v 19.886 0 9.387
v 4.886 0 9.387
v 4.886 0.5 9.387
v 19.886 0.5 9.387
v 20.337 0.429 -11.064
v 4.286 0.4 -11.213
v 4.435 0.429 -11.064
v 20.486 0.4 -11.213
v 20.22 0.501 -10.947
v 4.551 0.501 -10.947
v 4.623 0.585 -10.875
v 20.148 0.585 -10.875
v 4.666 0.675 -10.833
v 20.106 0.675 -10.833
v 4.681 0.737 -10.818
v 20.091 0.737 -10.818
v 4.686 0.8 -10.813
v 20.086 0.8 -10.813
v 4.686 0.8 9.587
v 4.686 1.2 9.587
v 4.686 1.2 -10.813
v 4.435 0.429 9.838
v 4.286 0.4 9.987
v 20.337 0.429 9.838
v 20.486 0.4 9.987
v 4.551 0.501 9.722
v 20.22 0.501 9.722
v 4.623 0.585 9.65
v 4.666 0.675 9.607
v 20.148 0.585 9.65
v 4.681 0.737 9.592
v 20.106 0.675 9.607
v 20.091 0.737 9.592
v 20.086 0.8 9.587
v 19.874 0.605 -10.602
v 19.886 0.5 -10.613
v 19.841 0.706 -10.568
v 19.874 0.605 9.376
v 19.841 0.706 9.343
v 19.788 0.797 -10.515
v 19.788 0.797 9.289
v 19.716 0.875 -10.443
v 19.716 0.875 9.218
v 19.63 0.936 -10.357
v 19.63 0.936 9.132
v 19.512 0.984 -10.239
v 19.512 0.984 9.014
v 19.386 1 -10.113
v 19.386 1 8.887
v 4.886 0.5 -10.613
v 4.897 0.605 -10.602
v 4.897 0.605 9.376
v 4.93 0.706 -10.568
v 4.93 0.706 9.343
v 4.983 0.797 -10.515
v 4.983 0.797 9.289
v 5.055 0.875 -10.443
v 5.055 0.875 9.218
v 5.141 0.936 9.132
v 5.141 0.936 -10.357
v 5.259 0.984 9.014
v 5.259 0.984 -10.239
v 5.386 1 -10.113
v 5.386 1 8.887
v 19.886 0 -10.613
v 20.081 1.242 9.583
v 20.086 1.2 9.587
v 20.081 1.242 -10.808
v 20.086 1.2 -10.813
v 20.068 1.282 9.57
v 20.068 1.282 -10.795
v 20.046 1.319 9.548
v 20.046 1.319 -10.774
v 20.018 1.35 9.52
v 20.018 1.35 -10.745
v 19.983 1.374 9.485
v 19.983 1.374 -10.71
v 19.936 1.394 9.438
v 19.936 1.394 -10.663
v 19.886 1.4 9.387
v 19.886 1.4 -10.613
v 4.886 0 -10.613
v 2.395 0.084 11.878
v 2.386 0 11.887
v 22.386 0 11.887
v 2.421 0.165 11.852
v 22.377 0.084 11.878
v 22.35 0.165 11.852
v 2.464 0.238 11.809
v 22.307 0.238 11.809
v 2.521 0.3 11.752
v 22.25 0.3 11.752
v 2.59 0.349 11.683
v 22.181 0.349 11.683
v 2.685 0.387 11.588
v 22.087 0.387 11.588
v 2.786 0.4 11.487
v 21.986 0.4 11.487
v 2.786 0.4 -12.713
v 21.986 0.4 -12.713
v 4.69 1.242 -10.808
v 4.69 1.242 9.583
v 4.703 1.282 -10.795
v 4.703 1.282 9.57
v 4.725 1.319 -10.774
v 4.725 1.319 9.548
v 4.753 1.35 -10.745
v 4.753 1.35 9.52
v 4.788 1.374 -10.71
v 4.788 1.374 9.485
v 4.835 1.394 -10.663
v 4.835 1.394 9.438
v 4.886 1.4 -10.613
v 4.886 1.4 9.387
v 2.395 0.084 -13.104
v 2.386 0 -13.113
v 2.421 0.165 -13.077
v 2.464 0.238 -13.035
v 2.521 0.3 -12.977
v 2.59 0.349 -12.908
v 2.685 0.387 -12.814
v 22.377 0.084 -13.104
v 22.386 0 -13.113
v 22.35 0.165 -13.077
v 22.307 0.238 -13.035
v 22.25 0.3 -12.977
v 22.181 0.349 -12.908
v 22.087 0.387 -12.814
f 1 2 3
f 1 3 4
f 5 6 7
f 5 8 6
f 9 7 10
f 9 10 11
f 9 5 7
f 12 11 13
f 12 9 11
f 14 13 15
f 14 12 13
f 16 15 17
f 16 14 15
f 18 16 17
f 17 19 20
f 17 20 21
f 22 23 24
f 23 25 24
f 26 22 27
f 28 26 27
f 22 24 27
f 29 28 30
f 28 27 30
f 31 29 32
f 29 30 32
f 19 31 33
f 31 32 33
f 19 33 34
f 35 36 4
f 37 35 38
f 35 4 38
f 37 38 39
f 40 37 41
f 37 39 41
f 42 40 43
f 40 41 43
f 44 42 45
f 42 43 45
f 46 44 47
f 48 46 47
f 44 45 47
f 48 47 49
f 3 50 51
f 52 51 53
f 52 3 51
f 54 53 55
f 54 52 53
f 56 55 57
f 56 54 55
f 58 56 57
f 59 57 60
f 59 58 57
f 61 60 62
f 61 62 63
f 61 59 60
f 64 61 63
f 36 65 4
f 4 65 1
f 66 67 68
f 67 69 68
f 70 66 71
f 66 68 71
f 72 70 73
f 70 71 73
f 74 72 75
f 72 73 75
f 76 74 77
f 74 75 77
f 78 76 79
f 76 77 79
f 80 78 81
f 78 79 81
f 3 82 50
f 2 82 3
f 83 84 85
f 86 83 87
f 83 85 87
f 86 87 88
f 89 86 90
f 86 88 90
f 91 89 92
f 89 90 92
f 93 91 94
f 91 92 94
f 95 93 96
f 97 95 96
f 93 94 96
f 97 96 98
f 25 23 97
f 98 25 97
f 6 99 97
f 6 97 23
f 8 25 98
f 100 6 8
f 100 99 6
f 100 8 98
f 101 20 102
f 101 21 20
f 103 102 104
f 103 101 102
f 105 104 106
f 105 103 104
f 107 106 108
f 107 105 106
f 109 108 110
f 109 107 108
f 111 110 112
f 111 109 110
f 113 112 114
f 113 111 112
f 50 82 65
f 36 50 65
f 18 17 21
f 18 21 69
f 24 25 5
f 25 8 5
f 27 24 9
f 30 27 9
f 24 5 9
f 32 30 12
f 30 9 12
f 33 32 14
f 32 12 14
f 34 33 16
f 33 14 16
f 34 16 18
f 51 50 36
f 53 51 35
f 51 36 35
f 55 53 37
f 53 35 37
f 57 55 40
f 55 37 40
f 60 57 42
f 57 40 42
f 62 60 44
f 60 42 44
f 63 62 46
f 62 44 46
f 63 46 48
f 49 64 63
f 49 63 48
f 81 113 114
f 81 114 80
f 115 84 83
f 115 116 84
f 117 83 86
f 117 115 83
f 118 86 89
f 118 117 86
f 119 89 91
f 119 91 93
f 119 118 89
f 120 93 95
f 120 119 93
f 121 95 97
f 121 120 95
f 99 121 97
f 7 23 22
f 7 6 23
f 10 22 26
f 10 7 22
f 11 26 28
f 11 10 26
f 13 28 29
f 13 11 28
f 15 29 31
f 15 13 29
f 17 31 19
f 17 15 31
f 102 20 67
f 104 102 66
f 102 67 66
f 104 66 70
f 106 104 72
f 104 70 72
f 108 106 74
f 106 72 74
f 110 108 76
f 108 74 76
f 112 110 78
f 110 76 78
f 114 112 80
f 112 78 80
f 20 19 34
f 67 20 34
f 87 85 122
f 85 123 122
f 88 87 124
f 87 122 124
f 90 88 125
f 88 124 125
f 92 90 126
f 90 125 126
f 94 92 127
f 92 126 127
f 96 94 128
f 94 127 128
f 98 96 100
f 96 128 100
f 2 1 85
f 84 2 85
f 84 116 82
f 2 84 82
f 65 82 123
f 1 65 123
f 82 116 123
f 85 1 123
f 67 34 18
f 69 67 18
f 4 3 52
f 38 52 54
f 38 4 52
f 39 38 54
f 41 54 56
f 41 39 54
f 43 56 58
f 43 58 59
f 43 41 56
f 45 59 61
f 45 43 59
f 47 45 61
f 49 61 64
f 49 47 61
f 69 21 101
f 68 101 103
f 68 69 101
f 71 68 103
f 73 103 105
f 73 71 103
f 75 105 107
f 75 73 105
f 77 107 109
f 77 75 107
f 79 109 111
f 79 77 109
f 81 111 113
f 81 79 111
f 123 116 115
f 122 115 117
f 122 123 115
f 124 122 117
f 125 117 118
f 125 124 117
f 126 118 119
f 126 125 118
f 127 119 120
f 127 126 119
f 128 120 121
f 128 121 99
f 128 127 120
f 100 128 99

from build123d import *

# Parameters (mm, degrees)
SKETCH1_W           = 20
SKETCH1_H           = 25
BOSS_EXTRUDE1_DEPTH = 0.4
SKETCH4_W           = 15.4
SKETCH4_H           = 20.4
BOSS_EXTRUDE3_DEPTH = 1
SKETCH5_W           = 15
SKETCH5_H           = 20
CUT_EXTRUDE1_DEPTH  = 1
FILLET3_R           = 0.4
FILLET4_R           = 0.2
FILLET5_R           = 0.5
FILLET6_R           = 0.4


with BuildPart() as part:
    # Sketch1 → Boss-Extrude1 (new body)
    with BuildSketch(Plane(origin=(0, 0, 0), x_dir=(1, 0, 0), z_dir=(0, 1, 0))):
        with Locations((12.385620915, 0.612745098)):
            Rectangle(SKETCH1_W, SKETCH1_H)
    extrude(amount=BOSS_EXTRUDE1_DEPTH)

    # Sketch4 → Boss-Extrude3 (add)
    with BuildSketch(Plane(origin=(0, 0.4, 0), x_dir=(1, 0, 0), z_dir=(0, 1, 0))):
        with Locations((12.385620915, 0.612745098)):
            Rectangle(SKETCH4_W, SKETCH4_H)
    extrude(amount=BOSS_EXTRUDE3_DEPTH)

    # Sketch5 → Cut-Extrude1 (cut)
    with BuildSketch(Plane.XZ):
        with Locations((12.385620915, -0.612745098)):
            Rectangle(SKETCH5_W, SKETCH5_H)
    extrude(amount=-CUT_EXTRUDE1_DEPTH, mode=Mode.SUBTRACT)

    # Fillet3
    fillet3_edges = [part.edges().sort_by_distance(p)[0] for p in [
        (4.685620915, 0.4, -0.612745098),
        (12.385620915, 0.4, 9.587254902),
        (20.085620915, 0.4, -0.612745098),
        (12.385620915, 0.4, -10.812745098),
    ]]
    fillet(fillet3_edges, radius=FILLET3_R)

    # Fillet4
    fillet4_edges = [part.edges().sort_by_distance(p)[0] for p in [
        (4.685620915, 1.4, -0.612745098),
        (12.385620915, 1.4, 9.587254902),
        (20.085620915, 1.4, -0.612745098),
        (12.385620915, 1.4, -10.812745098),
    ]]
    fillet(fillet4_edges, radius=FILLET4_R)

    # Fillet5
    fillet5_edges = [part.edges().sort_by_distance(p)[0] for p in [
        (4.885620915, 1, -0.612745098),
        (12.385620915, 1, 9.387254902),
        (19.885620915, 1, -0.612745098),
        (12.385620915, 1, -10.612745098),
    ]]
    fillet(fillet5_edges, radius=FILLET5_R)

    # Fillet6
    fillet6_edges = [part.edges().sort_by_distance(p)[0] for p in [
        (12.385620915, 0.4, 11.887254902),
        (2.385620915, 0.4, -0.612745098),
        (22.385620915, 0.4, -0.612745098),
        (12.385620915, 0.4, -13.112745098),
    ]]
    fillet(fillet6_edges, radius=FILLET6_R - 0.0001)  # a hair under: the kernel refuses the full size


solid = part.part
